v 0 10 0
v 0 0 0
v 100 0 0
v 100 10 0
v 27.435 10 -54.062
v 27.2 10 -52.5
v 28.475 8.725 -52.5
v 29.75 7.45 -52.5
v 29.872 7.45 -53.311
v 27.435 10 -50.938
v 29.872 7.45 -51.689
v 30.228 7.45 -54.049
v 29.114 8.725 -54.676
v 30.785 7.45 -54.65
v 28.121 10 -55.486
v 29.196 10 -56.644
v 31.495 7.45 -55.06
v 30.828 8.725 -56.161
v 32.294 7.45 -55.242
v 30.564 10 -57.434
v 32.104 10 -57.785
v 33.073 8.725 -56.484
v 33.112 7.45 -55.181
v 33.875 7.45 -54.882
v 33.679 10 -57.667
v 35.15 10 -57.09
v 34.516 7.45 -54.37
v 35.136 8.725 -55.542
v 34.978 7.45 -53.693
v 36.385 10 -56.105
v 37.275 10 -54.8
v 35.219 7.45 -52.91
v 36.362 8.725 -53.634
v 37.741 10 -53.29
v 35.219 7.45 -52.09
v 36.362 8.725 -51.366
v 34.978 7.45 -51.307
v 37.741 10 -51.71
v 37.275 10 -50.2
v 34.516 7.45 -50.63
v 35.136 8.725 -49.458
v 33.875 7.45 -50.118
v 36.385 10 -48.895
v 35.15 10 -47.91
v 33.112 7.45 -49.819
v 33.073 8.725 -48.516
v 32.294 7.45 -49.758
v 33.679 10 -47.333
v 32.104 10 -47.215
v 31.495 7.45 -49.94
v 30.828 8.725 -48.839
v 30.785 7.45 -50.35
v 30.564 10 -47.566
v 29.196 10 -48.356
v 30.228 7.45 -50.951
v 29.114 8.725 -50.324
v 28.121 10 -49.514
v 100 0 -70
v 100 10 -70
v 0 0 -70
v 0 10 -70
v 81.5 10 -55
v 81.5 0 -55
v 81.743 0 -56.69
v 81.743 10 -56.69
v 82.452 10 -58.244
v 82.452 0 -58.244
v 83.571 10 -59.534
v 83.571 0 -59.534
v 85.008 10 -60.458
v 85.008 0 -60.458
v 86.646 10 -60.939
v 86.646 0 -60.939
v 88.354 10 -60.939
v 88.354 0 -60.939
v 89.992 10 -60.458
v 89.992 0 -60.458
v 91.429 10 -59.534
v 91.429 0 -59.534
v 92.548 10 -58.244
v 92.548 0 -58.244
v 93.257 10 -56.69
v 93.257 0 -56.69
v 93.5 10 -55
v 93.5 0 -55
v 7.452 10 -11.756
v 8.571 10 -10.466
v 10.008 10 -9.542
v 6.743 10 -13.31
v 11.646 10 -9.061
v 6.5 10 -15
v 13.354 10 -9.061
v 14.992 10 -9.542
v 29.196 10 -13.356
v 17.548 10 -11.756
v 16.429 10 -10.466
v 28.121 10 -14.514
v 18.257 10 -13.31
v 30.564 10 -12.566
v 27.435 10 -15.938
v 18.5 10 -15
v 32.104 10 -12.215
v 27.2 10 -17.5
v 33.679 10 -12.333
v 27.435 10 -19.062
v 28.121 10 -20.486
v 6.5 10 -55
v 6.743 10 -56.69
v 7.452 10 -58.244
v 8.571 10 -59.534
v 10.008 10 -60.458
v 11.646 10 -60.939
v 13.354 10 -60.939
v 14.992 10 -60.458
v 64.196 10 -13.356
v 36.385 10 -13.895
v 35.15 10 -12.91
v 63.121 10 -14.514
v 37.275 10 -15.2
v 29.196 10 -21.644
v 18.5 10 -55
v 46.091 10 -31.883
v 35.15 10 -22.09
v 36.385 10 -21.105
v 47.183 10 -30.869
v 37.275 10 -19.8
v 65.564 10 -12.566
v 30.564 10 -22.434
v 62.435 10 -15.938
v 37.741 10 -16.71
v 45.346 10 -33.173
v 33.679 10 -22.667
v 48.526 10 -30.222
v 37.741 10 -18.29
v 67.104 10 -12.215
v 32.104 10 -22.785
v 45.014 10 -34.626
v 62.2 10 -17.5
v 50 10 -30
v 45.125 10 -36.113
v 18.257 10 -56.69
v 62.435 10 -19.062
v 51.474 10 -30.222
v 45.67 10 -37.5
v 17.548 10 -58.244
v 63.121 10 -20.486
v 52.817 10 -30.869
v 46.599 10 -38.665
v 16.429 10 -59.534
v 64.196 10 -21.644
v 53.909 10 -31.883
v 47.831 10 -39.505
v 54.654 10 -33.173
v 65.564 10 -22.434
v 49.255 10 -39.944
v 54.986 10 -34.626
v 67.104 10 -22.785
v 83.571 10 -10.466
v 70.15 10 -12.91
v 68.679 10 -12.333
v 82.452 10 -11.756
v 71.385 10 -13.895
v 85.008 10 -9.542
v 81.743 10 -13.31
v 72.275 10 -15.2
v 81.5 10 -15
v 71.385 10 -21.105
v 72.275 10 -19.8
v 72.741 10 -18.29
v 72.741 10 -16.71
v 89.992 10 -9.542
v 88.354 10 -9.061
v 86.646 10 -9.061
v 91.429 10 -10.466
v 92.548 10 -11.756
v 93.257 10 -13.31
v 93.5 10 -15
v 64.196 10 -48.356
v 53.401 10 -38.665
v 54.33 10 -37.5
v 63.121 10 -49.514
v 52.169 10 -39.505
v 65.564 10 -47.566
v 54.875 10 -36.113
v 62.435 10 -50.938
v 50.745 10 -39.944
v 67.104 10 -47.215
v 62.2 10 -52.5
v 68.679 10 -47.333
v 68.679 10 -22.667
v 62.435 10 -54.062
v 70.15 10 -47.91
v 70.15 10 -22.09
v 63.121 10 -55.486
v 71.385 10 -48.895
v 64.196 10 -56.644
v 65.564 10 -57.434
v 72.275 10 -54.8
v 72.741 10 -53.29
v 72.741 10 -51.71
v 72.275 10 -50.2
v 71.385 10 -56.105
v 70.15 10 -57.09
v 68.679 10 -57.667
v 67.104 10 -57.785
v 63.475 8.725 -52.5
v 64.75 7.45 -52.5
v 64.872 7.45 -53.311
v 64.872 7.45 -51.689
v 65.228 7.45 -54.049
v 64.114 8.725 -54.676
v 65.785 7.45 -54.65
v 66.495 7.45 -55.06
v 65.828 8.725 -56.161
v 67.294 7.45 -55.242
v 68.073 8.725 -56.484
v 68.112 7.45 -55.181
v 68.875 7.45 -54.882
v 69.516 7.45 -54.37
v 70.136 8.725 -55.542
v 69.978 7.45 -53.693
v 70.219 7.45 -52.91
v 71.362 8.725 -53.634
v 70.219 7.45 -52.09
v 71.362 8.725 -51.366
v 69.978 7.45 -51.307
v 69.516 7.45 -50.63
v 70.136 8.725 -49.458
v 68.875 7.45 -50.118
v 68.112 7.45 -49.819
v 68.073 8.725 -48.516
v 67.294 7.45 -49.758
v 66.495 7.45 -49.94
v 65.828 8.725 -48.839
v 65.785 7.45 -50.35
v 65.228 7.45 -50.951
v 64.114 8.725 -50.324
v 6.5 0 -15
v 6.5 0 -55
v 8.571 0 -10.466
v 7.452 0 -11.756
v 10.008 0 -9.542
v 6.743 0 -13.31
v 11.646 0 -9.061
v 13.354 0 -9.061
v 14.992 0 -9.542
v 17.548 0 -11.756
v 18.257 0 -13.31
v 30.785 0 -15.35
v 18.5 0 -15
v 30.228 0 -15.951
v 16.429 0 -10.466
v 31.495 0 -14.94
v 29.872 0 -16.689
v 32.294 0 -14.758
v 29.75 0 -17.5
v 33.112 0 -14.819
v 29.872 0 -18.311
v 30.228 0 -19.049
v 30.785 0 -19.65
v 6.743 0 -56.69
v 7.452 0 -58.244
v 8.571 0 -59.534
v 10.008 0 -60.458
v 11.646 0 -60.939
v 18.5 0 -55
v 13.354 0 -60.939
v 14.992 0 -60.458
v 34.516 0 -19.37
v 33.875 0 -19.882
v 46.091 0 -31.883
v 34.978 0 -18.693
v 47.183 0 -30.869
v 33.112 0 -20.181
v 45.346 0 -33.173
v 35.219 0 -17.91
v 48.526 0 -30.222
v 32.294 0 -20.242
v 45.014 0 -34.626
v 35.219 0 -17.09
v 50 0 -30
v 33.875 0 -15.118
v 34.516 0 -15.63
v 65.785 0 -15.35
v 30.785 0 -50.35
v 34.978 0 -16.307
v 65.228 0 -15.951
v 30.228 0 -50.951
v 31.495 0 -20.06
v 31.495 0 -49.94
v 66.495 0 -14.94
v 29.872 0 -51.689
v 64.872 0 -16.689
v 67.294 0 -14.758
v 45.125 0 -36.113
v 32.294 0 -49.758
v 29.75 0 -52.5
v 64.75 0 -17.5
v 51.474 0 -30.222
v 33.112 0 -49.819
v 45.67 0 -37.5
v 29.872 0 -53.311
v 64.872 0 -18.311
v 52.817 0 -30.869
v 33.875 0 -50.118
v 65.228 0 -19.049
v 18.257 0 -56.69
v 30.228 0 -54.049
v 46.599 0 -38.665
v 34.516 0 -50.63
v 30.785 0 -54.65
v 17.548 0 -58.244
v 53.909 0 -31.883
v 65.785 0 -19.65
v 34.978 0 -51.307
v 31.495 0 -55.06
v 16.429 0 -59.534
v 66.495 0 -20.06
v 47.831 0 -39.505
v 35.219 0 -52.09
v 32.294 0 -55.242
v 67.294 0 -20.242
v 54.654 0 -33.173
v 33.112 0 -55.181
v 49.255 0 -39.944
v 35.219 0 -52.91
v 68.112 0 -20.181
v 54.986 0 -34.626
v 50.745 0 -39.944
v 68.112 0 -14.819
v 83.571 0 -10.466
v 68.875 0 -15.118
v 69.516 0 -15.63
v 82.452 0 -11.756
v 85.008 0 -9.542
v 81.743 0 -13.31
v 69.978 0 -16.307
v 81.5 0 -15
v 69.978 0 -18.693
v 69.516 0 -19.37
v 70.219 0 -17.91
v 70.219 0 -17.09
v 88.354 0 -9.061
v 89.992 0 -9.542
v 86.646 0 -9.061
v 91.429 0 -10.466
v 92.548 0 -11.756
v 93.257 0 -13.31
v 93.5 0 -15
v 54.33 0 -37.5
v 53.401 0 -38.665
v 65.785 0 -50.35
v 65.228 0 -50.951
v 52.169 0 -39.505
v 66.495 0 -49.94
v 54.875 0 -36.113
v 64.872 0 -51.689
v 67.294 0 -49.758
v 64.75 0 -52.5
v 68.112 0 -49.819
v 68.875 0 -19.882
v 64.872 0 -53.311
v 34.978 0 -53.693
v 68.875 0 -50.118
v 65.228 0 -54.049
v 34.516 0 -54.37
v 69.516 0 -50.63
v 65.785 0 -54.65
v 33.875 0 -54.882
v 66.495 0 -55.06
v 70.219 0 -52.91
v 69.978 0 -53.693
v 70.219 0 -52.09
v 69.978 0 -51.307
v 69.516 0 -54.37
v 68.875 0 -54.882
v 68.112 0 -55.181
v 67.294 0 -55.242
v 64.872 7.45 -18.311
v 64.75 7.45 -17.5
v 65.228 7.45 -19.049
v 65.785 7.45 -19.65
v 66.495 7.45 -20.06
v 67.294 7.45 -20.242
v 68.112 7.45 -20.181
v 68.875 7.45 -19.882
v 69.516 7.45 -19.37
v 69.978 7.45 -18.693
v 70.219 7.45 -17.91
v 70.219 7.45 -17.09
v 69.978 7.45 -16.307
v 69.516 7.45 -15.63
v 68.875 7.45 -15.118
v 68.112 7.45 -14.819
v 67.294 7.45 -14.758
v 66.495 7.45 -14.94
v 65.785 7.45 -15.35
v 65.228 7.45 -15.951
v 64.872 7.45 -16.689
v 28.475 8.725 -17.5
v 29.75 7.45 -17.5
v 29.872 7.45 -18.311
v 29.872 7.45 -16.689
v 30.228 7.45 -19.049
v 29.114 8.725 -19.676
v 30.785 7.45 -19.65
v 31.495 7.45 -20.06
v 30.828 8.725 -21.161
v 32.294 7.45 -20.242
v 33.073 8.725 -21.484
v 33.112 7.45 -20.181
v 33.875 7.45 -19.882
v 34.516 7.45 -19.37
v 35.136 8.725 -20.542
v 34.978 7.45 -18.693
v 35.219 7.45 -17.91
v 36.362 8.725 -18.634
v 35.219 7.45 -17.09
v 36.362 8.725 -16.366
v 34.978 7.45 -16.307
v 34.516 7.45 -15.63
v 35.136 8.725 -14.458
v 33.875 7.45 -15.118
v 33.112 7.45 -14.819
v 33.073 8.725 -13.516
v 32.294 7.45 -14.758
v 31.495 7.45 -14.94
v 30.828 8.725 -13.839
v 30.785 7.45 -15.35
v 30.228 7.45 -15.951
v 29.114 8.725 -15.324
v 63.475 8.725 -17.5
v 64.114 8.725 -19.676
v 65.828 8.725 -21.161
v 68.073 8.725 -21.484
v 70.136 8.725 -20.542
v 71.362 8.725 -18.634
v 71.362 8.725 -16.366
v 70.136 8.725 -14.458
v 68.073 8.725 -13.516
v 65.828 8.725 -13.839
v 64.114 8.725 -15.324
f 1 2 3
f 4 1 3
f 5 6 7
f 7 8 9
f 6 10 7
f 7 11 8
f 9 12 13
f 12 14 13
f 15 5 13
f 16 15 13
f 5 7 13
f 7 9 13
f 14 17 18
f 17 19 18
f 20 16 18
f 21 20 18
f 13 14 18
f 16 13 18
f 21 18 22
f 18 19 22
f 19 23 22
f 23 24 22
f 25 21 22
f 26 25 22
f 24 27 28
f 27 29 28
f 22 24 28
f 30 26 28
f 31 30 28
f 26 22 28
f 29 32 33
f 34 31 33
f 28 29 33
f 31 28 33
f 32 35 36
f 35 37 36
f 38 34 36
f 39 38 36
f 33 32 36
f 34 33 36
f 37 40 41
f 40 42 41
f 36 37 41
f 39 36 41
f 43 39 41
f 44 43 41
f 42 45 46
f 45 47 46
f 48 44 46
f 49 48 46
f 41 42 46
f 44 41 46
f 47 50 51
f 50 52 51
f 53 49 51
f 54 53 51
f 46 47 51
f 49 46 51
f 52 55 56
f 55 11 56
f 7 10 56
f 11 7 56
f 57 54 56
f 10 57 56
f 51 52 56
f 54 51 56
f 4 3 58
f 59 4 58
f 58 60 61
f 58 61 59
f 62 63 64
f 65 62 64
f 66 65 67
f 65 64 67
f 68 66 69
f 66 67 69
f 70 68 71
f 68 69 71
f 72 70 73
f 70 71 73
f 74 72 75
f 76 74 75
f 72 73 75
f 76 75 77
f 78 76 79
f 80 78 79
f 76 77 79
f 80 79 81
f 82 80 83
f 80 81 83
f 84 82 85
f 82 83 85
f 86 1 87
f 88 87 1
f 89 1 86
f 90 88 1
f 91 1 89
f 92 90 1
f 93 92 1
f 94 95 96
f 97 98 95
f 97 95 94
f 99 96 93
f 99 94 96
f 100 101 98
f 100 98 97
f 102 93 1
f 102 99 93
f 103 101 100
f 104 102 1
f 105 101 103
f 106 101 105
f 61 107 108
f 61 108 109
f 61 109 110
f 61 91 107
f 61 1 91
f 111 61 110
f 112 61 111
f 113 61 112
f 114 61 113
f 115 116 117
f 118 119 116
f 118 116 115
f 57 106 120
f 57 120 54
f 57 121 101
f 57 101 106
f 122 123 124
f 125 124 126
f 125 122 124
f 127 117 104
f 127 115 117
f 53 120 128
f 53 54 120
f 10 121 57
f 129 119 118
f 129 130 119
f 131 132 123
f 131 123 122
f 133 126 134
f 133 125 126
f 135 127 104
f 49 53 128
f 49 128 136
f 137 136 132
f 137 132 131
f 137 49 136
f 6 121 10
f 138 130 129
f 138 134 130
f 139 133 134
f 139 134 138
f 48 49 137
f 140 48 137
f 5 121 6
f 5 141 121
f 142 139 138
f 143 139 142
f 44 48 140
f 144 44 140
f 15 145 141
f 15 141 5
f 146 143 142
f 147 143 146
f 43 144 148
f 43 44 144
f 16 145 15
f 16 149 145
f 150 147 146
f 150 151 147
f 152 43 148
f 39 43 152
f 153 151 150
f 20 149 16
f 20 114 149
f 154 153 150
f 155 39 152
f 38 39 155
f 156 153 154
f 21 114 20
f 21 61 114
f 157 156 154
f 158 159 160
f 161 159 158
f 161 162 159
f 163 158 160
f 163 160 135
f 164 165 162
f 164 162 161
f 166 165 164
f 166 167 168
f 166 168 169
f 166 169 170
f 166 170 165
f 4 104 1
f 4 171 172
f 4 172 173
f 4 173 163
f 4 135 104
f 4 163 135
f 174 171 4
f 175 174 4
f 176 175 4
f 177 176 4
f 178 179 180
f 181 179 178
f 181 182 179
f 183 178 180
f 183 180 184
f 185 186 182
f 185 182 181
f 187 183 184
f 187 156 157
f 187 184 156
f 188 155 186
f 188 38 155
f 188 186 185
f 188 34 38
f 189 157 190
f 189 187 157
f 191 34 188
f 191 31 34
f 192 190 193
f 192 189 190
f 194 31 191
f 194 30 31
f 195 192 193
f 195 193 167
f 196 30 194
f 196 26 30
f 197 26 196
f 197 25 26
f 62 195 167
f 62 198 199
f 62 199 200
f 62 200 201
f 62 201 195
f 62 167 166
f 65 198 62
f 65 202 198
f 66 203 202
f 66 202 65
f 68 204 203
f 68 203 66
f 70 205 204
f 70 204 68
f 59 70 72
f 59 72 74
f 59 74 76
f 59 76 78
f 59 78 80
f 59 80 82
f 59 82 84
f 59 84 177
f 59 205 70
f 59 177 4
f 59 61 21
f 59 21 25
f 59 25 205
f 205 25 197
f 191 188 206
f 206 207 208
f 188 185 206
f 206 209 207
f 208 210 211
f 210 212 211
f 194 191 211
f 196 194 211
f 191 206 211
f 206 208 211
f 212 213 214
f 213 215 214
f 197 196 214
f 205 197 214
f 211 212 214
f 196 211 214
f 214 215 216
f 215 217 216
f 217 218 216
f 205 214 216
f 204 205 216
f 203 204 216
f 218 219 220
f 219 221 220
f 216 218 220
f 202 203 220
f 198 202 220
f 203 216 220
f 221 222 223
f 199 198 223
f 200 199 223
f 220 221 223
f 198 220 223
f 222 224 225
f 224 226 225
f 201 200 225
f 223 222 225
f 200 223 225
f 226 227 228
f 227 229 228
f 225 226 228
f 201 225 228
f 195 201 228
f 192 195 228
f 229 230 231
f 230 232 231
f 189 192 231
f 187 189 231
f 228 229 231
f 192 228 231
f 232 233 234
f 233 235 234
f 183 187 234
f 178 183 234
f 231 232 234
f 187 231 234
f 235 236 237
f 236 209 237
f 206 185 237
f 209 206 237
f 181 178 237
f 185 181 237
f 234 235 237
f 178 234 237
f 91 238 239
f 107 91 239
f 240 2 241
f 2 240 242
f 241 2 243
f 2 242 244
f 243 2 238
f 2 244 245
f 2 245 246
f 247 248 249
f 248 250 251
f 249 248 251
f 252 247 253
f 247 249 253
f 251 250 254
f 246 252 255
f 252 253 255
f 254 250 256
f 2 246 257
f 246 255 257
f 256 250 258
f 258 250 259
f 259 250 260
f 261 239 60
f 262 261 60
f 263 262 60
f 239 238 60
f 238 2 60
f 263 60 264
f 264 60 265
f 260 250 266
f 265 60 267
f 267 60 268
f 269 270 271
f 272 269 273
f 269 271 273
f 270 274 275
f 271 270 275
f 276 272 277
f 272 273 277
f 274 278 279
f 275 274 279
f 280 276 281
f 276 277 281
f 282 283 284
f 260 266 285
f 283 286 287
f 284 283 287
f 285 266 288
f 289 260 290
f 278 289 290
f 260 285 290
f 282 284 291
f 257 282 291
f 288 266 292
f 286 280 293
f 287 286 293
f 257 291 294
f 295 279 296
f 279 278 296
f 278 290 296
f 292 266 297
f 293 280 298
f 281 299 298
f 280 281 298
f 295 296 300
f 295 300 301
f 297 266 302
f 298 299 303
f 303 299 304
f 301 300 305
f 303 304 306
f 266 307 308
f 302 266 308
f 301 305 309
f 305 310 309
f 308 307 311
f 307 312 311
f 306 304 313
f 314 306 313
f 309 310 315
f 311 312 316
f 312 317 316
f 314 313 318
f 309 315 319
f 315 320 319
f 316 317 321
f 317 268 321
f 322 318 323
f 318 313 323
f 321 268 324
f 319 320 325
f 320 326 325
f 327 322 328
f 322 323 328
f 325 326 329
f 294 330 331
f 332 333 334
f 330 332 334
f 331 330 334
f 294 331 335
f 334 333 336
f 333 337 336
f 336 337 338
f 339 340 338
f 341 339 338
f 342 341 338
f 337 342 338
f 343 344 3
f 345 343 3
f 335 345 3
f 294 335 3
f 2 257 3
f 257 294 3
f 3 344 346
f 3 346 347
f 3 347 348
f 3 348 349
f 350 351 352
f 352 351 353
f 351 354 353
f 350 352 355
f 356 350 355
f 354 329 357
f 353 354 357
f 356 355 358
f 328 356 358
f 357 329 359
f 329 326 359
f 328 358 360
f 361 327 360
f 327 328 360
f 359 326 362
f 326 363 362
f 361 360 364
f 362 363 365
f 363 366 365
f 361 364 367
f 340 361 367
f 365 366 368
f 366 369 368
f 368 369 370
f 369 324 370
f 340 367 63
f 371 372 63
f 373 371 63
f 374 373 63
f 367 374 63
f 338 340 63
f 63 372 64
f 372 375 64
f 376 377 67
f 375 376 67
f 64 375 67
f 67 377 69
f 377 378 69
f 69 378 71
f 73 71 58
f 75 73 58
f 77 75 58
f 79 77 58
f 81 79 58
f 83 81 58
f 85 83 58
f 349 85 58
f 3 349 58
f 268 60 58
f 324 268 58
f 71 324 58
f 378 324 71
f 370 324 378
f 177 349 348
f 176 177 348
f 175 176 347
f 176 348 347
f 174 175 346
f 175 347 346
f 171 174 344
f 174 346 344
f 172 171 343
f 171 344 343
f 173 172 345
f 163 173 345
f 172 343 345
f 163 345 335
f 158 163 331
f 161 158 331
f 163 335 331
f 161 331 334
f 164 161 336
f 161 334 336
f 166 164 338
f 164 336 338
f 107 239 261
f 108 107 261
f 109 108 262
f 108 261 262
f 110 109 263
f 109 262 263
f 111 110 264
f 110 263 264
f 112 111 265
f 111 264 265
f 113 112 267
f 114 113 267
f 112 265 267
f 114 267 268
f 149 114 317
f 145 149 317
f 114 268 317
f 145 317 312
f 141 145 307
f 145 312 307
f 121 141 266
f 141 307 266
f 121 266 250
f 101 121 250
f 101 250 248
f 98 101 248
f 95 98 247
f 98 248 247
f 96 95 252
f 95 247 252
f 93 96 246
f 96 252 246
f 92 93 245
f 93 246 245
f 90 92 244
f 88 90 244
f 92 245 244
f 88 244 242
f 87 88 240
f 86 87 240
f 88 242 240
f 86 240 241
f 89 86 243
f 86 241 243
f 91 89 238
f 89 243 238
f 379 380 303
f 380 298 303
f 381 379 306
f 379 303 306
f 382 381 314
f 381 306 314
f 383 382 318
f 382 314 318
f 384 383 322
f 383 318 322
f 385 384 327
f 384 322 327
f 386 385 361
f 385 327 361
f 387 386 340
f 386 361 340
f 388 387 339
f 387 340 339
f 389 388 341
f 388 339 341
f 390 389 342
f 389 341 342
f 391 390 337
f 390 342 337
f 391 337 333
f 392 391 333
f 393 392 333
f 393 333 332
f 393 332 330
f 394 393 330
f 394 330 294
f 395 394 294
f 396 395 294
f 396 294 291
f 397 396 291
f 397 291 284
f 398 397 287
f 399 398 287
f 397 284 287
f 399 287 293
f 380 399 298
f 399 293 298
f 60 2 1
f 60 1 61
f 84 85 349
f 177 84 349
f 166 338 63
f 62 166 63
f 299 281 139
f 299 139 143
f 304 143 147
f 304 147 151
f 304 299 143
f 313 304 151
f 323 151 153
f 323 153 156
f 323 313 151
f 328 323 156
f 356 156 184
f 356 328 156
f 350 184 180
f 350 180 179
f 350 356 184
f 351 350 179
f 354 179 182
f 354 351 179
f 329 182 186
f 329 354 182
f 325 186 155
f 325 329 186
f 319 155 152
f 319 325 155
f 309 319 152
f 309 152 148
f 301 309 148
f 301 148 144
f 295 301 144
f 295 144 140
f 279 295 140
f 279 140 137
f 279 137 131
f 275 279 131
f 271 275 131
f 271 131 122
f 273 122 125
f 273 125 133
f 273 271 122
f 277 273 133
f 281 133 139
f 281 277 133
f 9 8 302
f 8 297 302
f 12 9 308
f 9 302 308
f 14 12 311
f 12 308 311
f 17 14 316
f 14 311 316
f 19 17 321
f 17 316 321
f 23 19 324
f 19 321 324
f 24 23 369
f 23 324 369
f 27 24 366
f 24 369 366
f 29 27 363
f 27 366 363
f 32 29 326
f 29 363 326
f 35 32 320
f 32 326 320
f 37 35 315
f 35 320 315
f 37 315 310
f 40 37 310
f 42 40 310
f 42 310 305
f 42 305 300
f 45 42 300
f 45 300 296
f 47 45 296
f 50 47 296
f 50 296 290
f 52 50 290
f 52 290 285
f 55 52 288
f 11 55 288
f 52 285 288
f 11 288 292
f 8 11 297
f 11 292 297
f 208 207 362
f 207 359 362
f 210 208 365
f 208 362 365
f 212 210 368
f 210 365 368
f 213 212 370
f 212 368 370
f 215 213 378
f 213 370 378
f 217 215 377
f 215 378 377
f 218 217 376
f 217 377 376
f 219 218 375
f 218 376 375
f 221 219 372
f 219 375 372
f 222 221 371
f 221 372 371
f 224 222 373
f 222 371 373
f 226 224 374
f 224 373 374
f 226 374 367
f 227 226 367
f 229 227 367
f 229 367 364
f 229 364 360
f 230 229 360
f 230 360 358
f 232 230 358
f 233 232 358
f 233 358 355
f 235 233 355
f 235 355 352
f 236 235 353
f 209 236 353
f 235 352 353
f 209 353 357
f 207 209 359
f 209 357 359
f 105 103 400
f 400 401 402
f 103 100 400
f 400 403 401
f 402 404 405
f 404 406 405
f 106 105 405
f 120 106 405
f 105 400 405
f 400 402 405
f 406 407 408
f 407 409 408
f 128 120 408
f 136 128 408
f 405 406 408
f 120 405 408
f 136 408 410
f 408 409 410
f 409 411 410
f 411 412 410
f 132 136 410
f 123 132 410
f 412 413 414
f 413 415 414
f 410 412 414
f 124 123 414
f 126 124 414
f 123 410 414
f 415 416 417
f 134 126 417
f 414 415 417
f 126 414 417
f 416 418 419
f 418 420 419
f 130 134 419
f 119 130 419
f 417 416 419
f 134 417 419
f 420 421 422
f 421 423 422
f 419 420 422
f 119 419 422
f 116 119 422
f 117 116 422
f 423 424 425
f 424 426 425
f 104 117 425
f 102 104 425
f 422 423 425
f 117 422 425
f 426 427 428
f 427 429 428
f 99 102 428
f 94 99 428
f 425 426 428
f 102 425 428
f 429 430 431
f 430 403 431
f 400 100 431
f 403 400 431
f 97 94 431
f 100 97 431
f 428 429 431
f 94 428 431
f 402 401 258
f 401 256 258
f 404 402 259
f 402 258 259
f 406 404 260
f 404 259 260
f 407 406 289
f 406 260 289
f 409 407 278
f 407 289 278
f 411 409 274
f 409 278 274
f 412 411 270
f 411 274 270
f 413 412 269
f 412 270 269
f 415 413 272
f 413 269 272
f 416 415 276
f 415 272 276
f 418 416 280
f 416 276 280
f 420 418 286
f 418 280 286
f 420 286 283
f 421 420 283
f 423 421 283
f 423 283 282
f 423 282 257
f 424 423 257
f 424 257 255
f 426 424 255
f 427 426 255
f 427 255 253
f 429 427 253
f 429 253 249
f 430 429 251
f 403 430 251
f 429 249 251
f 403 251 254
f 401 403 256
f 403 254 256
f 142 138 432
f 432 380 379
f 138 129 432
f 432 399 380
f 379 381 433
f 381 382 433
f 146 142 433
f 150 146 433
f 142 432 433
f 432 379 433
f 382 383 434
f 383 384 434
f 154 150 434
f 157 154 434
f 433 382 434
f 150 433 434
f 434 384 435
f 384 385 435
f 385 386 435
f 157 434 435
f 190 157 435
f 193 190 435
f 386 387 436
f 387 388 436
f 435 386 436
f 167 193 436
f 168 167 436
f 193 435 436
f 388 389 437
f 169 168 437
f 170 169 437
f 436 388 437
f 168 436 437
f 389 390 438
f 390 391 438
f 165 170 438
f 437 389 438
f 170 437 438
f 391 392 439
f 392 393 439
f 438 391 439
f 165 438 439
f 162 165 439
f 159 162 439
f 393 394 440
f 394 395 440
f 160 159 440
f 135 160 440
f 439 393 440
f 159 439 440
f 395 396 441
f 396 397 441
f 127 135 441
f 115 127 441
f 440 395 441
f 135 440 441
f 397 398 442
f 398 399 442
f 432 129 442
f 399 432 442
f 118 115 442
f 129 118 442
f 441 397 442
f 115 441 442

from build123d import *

# Parameters (mm, degrees)
SKETCH1_W                                           = 100
SKETCH1_H                                           = 70
SKETCH1_R                                           = 5
BOSS_EXTRUDE1_DEPTH                                 = 10
CSK_FOR_M5_COUNTERSUNK_FLAT_HEAD_SCREW1_D           = 5.5
CSK_FOR_M5_COUNTERSUNK_FLAT_HEAD_SCREW1_CSINK_D     = 10.6
CSK_FOR_M5_COUNTERSUNK_FLAT_HEAD_SCREW1_CSINK_ANGLE = 90


with BuildPart() as part:
    # Sketch1 → Boss-Extrude1 (new body)
    with BuildSketch(Plane(origin=(0, 0, 0), x_dir=(1, 0, 0), z_dir=(0, 1, 0))):
        with Locations((50, 35)):
            Rectangle(SKETCH1_W, SKETCH1_H)
        with Locations(Location((50, 35, 0), (0, 0, 270))):
            Circle(SKETCH1_R, mode=Mode.SUBTRACT)
        with BuildLine():
            Line((18.5, 55), (18.5, 15))
            ThreePointArc((18.5, 15), (12.5, 9), (6.5, 15))
            Line((6.5, 15), (6.5, 55))
            ThreePointArc((6.5, 55), (12.5, 61), (18.5, 55))
        make_face(mode=Mode.SUBTRACT)
        with BuildLine():
            Line((93.5, 55), (93.5, 15))
            ThreePointArc((93.5, 15), (87.5, 9), (81.5, 15))
            Line((81.5, 15), (81.5, 55))
            ThreePointArc((81.5, 55), (87.5, 61), (93.5, 55))
        make_face(mode=Mode.SUBTRACT)
    extrude(amount=BOSS_EXTRUDE1_DEPTH)

    # CSK for M5 Countersunk Flat Head Screw1 (through all)
    with Locations(Plane(origin=(0, 10, 0), x_dir=(1, 0, 0), z_dir=(0, 1, 0))):
        with Locations((32.5, 52.5), (67.5, 52.5), (67.5, 17.5), (32.5, 17.5)):
            CounterSinkHole(CSK_FOR_M5_COUNTERSUNK_FLAT_HEAD_SCREW1_D / 2, CSK_FOR_M5_COUNTERSUNK_FLAT_HEAD_SCREW1_CSINK_D / 2, counter_sink_angle=CSK_FOR_M5_COUNTERSUNK_FLAT_HEAD_SCREW1_CSINK_ANGLE)


solid = part.part
